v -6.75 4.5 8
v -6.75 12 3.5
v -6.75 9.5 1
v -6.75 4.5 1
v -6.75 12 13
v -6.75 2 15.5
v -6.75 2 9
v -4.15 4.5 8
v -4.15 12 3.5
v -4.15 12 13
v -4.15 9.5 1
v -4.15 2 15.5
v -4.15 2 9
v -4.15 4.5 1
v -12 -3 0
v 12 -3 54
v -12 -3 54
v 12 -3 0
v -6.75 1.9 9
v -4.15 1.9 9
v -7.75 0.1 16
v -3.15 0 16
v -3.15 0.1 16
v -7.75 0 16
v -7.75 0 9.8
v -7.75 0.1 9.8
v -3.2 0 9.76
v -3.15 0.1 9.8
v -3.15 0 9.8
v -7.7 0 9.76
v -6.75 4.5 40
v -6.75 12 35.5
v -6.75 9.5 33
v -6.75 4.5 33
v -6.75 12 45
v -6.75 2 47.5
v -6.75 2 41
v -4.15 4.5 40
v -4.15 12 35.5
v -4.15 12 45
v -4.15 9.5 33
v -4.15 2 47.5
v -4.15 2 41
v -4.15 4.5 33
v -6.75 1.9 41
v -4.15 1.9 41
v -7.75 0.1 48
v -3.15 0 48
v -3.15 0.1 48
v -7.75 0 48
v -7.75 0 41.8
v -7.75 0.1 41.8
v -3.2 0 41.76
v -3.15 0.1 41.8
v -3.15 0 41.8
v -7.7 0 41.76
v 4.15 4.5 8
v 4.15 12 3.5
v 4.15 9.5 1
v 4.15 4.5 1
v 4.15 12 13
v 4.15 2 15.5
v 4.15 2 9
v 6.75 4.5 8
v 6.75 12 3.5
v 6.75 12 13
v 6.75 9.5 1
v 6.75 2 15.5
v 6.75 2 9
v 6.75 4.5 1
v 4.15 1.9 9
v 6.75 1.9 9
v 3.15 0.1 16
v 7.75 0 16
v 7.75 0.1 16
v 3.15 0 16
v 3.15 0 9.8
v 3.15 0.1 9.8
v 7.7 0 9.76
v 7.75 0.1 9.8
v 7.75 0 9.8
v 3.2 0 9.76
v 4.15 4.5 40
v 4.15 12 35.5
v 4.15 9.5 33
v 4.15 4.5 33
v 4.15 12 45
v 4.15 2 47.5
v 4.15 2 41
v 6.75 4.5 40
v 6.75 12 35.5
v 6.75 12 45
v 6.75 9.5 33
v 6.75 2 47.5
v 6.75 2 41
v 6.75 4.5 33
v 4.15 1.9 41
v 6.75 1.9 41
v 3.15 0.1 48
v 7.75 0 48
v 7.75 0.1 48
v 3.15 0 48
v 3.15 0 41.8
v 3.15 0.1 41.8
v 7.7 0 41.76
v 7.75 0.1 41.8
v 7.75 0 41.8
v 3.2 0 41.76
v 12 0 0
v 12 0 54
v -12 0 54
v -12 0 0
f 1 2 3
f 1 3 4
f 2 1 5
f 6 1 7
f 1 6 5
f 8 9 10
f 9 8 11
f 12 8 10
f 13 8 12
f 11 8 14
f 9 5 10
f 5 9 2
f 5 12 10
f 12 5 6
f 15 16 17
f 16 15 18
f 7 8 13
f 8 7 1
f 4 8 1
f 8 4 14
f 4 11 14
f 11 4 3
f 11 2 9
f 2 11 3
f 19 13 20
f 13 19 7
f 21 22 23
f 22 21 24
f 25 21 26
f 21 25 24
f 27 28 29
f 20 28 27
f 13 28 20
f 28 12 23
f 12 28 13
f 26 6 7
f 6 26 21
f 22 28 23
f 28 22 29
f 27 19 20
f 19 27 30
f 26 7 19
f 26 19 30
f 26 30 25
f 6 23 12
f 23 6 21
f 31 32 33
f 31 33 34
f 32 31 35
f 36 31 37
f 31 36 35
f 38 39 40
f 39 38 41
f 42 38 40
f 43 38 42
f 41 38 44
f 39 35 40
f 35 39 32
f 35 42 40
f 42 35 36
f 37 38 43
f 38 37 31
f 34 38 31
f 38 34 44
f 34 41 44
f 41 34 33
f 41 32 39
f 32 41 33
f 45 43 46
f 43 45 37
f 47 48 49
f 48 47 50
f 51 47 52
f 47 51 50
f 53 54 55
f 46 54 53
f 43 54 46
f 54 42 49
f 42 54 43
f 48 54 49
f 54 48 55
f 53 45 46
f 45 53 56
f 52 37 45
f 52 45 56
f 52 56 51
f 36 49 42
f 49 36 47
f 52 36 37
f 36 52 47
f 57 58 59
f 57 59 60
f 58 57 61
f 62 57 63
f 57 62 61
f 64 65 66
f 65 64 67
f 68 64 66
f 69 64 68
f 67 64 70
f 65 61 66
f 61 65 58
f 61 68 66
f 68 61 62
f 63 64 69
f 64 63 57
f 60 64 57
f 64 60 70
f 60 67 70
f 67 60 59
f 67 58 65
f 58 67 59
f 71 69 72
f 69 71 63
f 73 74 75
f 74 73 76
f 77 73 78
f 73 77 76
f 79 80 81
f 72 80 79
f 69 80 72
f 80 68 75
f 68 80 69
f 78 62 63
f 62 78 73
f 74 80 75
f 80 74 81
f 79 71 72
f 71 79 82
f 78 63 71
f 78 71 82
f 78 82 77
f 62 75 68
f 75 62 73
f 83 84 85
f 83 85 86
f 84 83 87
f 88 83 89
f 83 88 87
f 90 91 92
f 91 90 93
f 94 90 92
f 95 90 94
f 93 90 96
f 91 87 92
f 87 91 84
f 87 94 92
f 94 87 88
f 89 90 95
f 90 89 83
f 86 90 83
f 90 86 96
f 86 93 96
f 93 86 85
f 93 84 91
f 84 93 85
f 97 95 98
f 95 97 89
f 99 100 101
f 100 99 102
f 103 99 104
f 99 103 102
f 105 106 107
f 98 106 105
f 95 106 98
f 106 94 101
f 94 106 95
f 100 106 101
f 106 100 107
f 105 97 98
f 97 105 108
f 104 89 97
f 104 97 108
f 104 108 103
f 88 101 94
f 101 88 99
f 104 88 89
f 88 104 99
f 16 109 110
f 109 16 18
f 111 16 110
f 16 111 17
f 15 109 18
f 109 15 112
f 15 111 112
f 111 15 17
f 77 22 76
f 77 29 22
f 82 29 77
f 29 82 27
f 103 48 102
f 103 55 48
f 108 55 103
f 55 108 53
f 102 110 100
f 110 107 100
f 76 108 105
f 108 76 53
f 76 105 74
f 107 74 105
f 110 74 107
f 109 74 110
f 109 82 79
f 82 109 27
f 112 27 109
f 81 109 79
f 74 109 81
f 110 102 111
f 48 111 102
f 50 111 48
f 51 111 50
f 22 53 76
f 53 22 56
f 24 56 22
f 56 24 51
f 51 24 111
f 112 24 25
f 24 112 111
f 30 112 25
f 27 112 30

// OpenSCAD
/*
    Elfa Shelf Bracket SCAD model
    Author: Tony Jadid

    This OpenSCAD script generates an Elfa-compatible shelf bracket
    designed to fit standard Elfa wall rails with a reinforced backplate.

    Features:
    - Adjustable number of vertical hook columns and spacing between them.
    - Parametric hook geometry for inner/outside hook distance, depth, height,
      and notch placement.
    - Calculated hook height based on Elfa pitch and clearance gap.
    - Optional 3D measurement text for quick dimensional validation.
    - Configurable foundation fillet to improve slicer layer adhesion,
      reducing stress on thin hook joints.
    - Dual hook columns are created for each rail to provide a stiff,
      reinforced bracket structure.

    The model uses a 2D hook profile extruded across the hook width, then
    optionally adds a smooth tapered base foundation to merge with the backplate.
*/

/* [Horizontal Layout] */
number_of_columns = 1;            // Number of vertical standards (rails) to mount to or on a board
column_spacing_x = 85;            // Center-to-center distance between the columns (mm)

/* [Elfa Slot Spacing (Horizontal)] */
// Distance between the inner faces of the two hooks (mm)
hook_inner_distance = 8.3;  
// Distance between the outer faces of the two hooks (mm)
hook_outer_distance = 13.5;  

/* [Information Display] */
// Show calculated dimensions as 3D text above the model (turn off before printing)
show_measurement_text = false;

/* [Elfa Mount Settings] */
number_of_hooks = 2;              // Number of vertical hooks per column
bracket_width_per_column = 24;    // The base width of the backplate covering one column group
backplate_thickness = 3;

/* [Strength Optimization] */
// How deep the hooks penetrate into the interior (mm)
hook_embed_depth = 3;     
// Chamfer/fillet radius at the base of the hook inside the backplate (mm)
hook_root_chamfer = 2.5;    

/* [Slicer Layer Overlap Optimization,  this seems to work] */
// To prevent the slicer from creating a weak flat layer joint, a 3D foundation taper forces intersecting perimeters.
hook_base_width_fillet = 1;     // Taper lateral width left/right (adds total width at surface)
hook_base_height_fillet = 0;  // Taper vertically up/down along the backplate
hook_base_fillet_depth = 2;   // Length of taper transitioning outwards into the main hook

/* [Spacing & Height] */
hook_pitch_y = 32;           // Standard Elfa pitch vertically (center-to-center distance)
hook_vertical_offset = 1;   // Distance from bottom of bracket to first hook
bracket_top_margin = 21;      // Margin above the top hook

/* [Hook Profile (Elfa Style)] */
hook_depth = 12;             // Depth penetrating the wall standard
hook_top_y_front = 15;       // Front top height of the hook
hook_top_y_back = 12;        // Sloped rear top height for insertion
hook_gap_size = 20;          // Distance BETWEEN one hook bottom and the next hook top
notch_depth = 4.5;              // Clearance for standard wall thickness
notch_distance_from_bottom = 7; // Distance from the hook's lowest tip up to the notch (rests on the standard)
base_bottom_y = 8.8;            // Bottom angle thickness matching notch
hook_tip_chamfer = 2.5;       // Angled tip for smoother insertion

/* [Appearance] */
bracket_color = "#4682B4"; // SteelBlue
text_color = "#FFFFFF";    // White

// --- Calculations ---
// The hook width is the half-gap between the two hook faces.
hook_width = (hook_outer_distance - hook_inner_distance) / 2;
// The horizontal spacing of the hook pair within a column.
calculated_hook_pitch_x = hook_inner_distance + hook_width;

// Calculate the total height of each hook from its pitch and clearance gap.
calculated_hook_total_height = hook_pitch_y - hook_gap_size;

// Auto-calculate structural dimensions
bracket_height = hook_vertical_offset + ((number_of_hooks - 1) * hook_pitch_y) + bracket_top_margin;
total_bracket_width = (number_of_columns - 1) * column_spacing_x + bracket_width_per_column;

// Optional debug labels showing the calculated hook dimensions above the part.
if (show_measurement_text) {
    color(text_color)
    translate([0, 0, bracket_height + 5])
    rotate([90, 0, 0])
    linear_extrude(1)
    union() {
        text(str("Hook Width: ", hook_width, " mm"), size = 2.5, halign = "center", valign = "bottom");
        translate([0, -4, 0])
            text(str("Calculated Hook Height: ", calculated_hook_total_height, " mm"), size = 2.5, halign = "center", valign = "bottom");
    }
}

color(bracket_color)
union() {
    // Main solid support backplate spanning across all columns
    translate([-total_bracket_width/2, -backplate_thickness, 0])
        cube([total_bracket_width, backplate_thickness, bracket_height]);

    // Generate hook groups for each column
    for (col = [0 : number_of_columns - 1]) {
        x_col_offset = (col - (number_of_columns - 1) / 2) * column_spacing_x;
        
        translate([x_col_offset, 0, 0]) {
            // Left reinforced hook column
            translate([-calculated_hook_pitch_x/2, 0, 0])
                hook_column();

            // Right reinforced hook column
            translate([calculated_hook_pitch_x/2, 0, 0])
                hook_column();
        }
    }
}

// Build one column of hooks arranged vertically.
// Each hook in the column is placed at the standard Elfa pitch.
module hook_column() {
    // Compute the bottom of the hook geometry from the rear top height.
    hook_bottom_z = hook_top_y_back - calculated_hook_total_height;
    // Calculated Z-value for the notch based on the distance from the hook bottom
    actual_notch_z = hook_bottom_z + notch_distance_from_bottom;
    
    for (i = [0 : number_of_hooks - 1]) {
        z_pos = hook_vertical_offset + (i * hook_pitch_y);
        
        translate([0, 0, z_pos]) {
            // 1. The core constant-thickness hook profile
            // Polygon X -> Depth (Y), Polygon Y -> Height (Z)
            rotate([90, 0, 90])
            linear_extrude(height=hook_width, center=true)
            polygon([
                [-hook_embed_depth, base_bottom_y - hook_root_chamfer], 
                [0, base_bottom_y],                                       
                [notch_depth, actual_notch_z],                              
                [notch_depth, hook_bottom_z],                               
                [hook_depth - hook_tip_chamfer, hook_bottom_z],            
                [hook_depth, hook_bottom_z + hook_tip_chamfer],            
                [hook_depth, hook_top_y_back],                          
                [0, hook_top_y_front],                                   
                [-hook_embed_depth, hook_top_y_front + hook_root_chamfer] 
            ]);
            
            // 2. The 3D Tapered Foundation for Slicer Adhesion
            // Gradually slopes from a widened base footprint down to the bare hook shape.
            if (hook_base_fillet_depth > 0) {
                y_target = hook_base_fillet_depth;
                
                // Interpolate matching heights to follow the exact slopes of the hook profile.
                // These values define the tapering shape between the hook surface and the wide base.
                t_bottom = y_target / notch_depth;
                z_bottom_taper = base_bottom_y * (1 - t_bottom) + actual_notch_z * t_bottom;
                
                t_top = y_target / hook_depth;
                z_top_taper = hook_top_y_front * (1 - t_top) + hook_top_y_back * t_top;
                
                hull() {
                    // Wide foundation base deeply bonded with the backplate surface.
                    // This polygon defines the widened support footprint.
                    rotate([90, 0, 90])
                    linear_extrude(height=hook_width + hook_base_width_fillet*2, center=true)
                    polygon([
                        [-0.1, base_bottom_y - hook_base_height_fillet],
                        [0.1, base_bottom_y - hook_base_height_fillet],
                        [0.1, hook_top_y_front + hook_base_height_fillet],
                        [-0.1, hook_top_y_front + hook_base_height_fillet]
                    ]);
                    
                    // Merging smoothly into the exact hook dimensions at the taper depth.
                    rotate([90, 0, 90])
                    linear_extrude(height=hook_width, center=true)
                    polygon([
                        [y_target - 0.1, z_bottom_taper],
                        [y_target, z_bottom_taper],
                        [y_target, z_top_taper],
                        [y_target - 0.1, z_top_taper]
                    ]);
                }
            }
        }
    }
}
